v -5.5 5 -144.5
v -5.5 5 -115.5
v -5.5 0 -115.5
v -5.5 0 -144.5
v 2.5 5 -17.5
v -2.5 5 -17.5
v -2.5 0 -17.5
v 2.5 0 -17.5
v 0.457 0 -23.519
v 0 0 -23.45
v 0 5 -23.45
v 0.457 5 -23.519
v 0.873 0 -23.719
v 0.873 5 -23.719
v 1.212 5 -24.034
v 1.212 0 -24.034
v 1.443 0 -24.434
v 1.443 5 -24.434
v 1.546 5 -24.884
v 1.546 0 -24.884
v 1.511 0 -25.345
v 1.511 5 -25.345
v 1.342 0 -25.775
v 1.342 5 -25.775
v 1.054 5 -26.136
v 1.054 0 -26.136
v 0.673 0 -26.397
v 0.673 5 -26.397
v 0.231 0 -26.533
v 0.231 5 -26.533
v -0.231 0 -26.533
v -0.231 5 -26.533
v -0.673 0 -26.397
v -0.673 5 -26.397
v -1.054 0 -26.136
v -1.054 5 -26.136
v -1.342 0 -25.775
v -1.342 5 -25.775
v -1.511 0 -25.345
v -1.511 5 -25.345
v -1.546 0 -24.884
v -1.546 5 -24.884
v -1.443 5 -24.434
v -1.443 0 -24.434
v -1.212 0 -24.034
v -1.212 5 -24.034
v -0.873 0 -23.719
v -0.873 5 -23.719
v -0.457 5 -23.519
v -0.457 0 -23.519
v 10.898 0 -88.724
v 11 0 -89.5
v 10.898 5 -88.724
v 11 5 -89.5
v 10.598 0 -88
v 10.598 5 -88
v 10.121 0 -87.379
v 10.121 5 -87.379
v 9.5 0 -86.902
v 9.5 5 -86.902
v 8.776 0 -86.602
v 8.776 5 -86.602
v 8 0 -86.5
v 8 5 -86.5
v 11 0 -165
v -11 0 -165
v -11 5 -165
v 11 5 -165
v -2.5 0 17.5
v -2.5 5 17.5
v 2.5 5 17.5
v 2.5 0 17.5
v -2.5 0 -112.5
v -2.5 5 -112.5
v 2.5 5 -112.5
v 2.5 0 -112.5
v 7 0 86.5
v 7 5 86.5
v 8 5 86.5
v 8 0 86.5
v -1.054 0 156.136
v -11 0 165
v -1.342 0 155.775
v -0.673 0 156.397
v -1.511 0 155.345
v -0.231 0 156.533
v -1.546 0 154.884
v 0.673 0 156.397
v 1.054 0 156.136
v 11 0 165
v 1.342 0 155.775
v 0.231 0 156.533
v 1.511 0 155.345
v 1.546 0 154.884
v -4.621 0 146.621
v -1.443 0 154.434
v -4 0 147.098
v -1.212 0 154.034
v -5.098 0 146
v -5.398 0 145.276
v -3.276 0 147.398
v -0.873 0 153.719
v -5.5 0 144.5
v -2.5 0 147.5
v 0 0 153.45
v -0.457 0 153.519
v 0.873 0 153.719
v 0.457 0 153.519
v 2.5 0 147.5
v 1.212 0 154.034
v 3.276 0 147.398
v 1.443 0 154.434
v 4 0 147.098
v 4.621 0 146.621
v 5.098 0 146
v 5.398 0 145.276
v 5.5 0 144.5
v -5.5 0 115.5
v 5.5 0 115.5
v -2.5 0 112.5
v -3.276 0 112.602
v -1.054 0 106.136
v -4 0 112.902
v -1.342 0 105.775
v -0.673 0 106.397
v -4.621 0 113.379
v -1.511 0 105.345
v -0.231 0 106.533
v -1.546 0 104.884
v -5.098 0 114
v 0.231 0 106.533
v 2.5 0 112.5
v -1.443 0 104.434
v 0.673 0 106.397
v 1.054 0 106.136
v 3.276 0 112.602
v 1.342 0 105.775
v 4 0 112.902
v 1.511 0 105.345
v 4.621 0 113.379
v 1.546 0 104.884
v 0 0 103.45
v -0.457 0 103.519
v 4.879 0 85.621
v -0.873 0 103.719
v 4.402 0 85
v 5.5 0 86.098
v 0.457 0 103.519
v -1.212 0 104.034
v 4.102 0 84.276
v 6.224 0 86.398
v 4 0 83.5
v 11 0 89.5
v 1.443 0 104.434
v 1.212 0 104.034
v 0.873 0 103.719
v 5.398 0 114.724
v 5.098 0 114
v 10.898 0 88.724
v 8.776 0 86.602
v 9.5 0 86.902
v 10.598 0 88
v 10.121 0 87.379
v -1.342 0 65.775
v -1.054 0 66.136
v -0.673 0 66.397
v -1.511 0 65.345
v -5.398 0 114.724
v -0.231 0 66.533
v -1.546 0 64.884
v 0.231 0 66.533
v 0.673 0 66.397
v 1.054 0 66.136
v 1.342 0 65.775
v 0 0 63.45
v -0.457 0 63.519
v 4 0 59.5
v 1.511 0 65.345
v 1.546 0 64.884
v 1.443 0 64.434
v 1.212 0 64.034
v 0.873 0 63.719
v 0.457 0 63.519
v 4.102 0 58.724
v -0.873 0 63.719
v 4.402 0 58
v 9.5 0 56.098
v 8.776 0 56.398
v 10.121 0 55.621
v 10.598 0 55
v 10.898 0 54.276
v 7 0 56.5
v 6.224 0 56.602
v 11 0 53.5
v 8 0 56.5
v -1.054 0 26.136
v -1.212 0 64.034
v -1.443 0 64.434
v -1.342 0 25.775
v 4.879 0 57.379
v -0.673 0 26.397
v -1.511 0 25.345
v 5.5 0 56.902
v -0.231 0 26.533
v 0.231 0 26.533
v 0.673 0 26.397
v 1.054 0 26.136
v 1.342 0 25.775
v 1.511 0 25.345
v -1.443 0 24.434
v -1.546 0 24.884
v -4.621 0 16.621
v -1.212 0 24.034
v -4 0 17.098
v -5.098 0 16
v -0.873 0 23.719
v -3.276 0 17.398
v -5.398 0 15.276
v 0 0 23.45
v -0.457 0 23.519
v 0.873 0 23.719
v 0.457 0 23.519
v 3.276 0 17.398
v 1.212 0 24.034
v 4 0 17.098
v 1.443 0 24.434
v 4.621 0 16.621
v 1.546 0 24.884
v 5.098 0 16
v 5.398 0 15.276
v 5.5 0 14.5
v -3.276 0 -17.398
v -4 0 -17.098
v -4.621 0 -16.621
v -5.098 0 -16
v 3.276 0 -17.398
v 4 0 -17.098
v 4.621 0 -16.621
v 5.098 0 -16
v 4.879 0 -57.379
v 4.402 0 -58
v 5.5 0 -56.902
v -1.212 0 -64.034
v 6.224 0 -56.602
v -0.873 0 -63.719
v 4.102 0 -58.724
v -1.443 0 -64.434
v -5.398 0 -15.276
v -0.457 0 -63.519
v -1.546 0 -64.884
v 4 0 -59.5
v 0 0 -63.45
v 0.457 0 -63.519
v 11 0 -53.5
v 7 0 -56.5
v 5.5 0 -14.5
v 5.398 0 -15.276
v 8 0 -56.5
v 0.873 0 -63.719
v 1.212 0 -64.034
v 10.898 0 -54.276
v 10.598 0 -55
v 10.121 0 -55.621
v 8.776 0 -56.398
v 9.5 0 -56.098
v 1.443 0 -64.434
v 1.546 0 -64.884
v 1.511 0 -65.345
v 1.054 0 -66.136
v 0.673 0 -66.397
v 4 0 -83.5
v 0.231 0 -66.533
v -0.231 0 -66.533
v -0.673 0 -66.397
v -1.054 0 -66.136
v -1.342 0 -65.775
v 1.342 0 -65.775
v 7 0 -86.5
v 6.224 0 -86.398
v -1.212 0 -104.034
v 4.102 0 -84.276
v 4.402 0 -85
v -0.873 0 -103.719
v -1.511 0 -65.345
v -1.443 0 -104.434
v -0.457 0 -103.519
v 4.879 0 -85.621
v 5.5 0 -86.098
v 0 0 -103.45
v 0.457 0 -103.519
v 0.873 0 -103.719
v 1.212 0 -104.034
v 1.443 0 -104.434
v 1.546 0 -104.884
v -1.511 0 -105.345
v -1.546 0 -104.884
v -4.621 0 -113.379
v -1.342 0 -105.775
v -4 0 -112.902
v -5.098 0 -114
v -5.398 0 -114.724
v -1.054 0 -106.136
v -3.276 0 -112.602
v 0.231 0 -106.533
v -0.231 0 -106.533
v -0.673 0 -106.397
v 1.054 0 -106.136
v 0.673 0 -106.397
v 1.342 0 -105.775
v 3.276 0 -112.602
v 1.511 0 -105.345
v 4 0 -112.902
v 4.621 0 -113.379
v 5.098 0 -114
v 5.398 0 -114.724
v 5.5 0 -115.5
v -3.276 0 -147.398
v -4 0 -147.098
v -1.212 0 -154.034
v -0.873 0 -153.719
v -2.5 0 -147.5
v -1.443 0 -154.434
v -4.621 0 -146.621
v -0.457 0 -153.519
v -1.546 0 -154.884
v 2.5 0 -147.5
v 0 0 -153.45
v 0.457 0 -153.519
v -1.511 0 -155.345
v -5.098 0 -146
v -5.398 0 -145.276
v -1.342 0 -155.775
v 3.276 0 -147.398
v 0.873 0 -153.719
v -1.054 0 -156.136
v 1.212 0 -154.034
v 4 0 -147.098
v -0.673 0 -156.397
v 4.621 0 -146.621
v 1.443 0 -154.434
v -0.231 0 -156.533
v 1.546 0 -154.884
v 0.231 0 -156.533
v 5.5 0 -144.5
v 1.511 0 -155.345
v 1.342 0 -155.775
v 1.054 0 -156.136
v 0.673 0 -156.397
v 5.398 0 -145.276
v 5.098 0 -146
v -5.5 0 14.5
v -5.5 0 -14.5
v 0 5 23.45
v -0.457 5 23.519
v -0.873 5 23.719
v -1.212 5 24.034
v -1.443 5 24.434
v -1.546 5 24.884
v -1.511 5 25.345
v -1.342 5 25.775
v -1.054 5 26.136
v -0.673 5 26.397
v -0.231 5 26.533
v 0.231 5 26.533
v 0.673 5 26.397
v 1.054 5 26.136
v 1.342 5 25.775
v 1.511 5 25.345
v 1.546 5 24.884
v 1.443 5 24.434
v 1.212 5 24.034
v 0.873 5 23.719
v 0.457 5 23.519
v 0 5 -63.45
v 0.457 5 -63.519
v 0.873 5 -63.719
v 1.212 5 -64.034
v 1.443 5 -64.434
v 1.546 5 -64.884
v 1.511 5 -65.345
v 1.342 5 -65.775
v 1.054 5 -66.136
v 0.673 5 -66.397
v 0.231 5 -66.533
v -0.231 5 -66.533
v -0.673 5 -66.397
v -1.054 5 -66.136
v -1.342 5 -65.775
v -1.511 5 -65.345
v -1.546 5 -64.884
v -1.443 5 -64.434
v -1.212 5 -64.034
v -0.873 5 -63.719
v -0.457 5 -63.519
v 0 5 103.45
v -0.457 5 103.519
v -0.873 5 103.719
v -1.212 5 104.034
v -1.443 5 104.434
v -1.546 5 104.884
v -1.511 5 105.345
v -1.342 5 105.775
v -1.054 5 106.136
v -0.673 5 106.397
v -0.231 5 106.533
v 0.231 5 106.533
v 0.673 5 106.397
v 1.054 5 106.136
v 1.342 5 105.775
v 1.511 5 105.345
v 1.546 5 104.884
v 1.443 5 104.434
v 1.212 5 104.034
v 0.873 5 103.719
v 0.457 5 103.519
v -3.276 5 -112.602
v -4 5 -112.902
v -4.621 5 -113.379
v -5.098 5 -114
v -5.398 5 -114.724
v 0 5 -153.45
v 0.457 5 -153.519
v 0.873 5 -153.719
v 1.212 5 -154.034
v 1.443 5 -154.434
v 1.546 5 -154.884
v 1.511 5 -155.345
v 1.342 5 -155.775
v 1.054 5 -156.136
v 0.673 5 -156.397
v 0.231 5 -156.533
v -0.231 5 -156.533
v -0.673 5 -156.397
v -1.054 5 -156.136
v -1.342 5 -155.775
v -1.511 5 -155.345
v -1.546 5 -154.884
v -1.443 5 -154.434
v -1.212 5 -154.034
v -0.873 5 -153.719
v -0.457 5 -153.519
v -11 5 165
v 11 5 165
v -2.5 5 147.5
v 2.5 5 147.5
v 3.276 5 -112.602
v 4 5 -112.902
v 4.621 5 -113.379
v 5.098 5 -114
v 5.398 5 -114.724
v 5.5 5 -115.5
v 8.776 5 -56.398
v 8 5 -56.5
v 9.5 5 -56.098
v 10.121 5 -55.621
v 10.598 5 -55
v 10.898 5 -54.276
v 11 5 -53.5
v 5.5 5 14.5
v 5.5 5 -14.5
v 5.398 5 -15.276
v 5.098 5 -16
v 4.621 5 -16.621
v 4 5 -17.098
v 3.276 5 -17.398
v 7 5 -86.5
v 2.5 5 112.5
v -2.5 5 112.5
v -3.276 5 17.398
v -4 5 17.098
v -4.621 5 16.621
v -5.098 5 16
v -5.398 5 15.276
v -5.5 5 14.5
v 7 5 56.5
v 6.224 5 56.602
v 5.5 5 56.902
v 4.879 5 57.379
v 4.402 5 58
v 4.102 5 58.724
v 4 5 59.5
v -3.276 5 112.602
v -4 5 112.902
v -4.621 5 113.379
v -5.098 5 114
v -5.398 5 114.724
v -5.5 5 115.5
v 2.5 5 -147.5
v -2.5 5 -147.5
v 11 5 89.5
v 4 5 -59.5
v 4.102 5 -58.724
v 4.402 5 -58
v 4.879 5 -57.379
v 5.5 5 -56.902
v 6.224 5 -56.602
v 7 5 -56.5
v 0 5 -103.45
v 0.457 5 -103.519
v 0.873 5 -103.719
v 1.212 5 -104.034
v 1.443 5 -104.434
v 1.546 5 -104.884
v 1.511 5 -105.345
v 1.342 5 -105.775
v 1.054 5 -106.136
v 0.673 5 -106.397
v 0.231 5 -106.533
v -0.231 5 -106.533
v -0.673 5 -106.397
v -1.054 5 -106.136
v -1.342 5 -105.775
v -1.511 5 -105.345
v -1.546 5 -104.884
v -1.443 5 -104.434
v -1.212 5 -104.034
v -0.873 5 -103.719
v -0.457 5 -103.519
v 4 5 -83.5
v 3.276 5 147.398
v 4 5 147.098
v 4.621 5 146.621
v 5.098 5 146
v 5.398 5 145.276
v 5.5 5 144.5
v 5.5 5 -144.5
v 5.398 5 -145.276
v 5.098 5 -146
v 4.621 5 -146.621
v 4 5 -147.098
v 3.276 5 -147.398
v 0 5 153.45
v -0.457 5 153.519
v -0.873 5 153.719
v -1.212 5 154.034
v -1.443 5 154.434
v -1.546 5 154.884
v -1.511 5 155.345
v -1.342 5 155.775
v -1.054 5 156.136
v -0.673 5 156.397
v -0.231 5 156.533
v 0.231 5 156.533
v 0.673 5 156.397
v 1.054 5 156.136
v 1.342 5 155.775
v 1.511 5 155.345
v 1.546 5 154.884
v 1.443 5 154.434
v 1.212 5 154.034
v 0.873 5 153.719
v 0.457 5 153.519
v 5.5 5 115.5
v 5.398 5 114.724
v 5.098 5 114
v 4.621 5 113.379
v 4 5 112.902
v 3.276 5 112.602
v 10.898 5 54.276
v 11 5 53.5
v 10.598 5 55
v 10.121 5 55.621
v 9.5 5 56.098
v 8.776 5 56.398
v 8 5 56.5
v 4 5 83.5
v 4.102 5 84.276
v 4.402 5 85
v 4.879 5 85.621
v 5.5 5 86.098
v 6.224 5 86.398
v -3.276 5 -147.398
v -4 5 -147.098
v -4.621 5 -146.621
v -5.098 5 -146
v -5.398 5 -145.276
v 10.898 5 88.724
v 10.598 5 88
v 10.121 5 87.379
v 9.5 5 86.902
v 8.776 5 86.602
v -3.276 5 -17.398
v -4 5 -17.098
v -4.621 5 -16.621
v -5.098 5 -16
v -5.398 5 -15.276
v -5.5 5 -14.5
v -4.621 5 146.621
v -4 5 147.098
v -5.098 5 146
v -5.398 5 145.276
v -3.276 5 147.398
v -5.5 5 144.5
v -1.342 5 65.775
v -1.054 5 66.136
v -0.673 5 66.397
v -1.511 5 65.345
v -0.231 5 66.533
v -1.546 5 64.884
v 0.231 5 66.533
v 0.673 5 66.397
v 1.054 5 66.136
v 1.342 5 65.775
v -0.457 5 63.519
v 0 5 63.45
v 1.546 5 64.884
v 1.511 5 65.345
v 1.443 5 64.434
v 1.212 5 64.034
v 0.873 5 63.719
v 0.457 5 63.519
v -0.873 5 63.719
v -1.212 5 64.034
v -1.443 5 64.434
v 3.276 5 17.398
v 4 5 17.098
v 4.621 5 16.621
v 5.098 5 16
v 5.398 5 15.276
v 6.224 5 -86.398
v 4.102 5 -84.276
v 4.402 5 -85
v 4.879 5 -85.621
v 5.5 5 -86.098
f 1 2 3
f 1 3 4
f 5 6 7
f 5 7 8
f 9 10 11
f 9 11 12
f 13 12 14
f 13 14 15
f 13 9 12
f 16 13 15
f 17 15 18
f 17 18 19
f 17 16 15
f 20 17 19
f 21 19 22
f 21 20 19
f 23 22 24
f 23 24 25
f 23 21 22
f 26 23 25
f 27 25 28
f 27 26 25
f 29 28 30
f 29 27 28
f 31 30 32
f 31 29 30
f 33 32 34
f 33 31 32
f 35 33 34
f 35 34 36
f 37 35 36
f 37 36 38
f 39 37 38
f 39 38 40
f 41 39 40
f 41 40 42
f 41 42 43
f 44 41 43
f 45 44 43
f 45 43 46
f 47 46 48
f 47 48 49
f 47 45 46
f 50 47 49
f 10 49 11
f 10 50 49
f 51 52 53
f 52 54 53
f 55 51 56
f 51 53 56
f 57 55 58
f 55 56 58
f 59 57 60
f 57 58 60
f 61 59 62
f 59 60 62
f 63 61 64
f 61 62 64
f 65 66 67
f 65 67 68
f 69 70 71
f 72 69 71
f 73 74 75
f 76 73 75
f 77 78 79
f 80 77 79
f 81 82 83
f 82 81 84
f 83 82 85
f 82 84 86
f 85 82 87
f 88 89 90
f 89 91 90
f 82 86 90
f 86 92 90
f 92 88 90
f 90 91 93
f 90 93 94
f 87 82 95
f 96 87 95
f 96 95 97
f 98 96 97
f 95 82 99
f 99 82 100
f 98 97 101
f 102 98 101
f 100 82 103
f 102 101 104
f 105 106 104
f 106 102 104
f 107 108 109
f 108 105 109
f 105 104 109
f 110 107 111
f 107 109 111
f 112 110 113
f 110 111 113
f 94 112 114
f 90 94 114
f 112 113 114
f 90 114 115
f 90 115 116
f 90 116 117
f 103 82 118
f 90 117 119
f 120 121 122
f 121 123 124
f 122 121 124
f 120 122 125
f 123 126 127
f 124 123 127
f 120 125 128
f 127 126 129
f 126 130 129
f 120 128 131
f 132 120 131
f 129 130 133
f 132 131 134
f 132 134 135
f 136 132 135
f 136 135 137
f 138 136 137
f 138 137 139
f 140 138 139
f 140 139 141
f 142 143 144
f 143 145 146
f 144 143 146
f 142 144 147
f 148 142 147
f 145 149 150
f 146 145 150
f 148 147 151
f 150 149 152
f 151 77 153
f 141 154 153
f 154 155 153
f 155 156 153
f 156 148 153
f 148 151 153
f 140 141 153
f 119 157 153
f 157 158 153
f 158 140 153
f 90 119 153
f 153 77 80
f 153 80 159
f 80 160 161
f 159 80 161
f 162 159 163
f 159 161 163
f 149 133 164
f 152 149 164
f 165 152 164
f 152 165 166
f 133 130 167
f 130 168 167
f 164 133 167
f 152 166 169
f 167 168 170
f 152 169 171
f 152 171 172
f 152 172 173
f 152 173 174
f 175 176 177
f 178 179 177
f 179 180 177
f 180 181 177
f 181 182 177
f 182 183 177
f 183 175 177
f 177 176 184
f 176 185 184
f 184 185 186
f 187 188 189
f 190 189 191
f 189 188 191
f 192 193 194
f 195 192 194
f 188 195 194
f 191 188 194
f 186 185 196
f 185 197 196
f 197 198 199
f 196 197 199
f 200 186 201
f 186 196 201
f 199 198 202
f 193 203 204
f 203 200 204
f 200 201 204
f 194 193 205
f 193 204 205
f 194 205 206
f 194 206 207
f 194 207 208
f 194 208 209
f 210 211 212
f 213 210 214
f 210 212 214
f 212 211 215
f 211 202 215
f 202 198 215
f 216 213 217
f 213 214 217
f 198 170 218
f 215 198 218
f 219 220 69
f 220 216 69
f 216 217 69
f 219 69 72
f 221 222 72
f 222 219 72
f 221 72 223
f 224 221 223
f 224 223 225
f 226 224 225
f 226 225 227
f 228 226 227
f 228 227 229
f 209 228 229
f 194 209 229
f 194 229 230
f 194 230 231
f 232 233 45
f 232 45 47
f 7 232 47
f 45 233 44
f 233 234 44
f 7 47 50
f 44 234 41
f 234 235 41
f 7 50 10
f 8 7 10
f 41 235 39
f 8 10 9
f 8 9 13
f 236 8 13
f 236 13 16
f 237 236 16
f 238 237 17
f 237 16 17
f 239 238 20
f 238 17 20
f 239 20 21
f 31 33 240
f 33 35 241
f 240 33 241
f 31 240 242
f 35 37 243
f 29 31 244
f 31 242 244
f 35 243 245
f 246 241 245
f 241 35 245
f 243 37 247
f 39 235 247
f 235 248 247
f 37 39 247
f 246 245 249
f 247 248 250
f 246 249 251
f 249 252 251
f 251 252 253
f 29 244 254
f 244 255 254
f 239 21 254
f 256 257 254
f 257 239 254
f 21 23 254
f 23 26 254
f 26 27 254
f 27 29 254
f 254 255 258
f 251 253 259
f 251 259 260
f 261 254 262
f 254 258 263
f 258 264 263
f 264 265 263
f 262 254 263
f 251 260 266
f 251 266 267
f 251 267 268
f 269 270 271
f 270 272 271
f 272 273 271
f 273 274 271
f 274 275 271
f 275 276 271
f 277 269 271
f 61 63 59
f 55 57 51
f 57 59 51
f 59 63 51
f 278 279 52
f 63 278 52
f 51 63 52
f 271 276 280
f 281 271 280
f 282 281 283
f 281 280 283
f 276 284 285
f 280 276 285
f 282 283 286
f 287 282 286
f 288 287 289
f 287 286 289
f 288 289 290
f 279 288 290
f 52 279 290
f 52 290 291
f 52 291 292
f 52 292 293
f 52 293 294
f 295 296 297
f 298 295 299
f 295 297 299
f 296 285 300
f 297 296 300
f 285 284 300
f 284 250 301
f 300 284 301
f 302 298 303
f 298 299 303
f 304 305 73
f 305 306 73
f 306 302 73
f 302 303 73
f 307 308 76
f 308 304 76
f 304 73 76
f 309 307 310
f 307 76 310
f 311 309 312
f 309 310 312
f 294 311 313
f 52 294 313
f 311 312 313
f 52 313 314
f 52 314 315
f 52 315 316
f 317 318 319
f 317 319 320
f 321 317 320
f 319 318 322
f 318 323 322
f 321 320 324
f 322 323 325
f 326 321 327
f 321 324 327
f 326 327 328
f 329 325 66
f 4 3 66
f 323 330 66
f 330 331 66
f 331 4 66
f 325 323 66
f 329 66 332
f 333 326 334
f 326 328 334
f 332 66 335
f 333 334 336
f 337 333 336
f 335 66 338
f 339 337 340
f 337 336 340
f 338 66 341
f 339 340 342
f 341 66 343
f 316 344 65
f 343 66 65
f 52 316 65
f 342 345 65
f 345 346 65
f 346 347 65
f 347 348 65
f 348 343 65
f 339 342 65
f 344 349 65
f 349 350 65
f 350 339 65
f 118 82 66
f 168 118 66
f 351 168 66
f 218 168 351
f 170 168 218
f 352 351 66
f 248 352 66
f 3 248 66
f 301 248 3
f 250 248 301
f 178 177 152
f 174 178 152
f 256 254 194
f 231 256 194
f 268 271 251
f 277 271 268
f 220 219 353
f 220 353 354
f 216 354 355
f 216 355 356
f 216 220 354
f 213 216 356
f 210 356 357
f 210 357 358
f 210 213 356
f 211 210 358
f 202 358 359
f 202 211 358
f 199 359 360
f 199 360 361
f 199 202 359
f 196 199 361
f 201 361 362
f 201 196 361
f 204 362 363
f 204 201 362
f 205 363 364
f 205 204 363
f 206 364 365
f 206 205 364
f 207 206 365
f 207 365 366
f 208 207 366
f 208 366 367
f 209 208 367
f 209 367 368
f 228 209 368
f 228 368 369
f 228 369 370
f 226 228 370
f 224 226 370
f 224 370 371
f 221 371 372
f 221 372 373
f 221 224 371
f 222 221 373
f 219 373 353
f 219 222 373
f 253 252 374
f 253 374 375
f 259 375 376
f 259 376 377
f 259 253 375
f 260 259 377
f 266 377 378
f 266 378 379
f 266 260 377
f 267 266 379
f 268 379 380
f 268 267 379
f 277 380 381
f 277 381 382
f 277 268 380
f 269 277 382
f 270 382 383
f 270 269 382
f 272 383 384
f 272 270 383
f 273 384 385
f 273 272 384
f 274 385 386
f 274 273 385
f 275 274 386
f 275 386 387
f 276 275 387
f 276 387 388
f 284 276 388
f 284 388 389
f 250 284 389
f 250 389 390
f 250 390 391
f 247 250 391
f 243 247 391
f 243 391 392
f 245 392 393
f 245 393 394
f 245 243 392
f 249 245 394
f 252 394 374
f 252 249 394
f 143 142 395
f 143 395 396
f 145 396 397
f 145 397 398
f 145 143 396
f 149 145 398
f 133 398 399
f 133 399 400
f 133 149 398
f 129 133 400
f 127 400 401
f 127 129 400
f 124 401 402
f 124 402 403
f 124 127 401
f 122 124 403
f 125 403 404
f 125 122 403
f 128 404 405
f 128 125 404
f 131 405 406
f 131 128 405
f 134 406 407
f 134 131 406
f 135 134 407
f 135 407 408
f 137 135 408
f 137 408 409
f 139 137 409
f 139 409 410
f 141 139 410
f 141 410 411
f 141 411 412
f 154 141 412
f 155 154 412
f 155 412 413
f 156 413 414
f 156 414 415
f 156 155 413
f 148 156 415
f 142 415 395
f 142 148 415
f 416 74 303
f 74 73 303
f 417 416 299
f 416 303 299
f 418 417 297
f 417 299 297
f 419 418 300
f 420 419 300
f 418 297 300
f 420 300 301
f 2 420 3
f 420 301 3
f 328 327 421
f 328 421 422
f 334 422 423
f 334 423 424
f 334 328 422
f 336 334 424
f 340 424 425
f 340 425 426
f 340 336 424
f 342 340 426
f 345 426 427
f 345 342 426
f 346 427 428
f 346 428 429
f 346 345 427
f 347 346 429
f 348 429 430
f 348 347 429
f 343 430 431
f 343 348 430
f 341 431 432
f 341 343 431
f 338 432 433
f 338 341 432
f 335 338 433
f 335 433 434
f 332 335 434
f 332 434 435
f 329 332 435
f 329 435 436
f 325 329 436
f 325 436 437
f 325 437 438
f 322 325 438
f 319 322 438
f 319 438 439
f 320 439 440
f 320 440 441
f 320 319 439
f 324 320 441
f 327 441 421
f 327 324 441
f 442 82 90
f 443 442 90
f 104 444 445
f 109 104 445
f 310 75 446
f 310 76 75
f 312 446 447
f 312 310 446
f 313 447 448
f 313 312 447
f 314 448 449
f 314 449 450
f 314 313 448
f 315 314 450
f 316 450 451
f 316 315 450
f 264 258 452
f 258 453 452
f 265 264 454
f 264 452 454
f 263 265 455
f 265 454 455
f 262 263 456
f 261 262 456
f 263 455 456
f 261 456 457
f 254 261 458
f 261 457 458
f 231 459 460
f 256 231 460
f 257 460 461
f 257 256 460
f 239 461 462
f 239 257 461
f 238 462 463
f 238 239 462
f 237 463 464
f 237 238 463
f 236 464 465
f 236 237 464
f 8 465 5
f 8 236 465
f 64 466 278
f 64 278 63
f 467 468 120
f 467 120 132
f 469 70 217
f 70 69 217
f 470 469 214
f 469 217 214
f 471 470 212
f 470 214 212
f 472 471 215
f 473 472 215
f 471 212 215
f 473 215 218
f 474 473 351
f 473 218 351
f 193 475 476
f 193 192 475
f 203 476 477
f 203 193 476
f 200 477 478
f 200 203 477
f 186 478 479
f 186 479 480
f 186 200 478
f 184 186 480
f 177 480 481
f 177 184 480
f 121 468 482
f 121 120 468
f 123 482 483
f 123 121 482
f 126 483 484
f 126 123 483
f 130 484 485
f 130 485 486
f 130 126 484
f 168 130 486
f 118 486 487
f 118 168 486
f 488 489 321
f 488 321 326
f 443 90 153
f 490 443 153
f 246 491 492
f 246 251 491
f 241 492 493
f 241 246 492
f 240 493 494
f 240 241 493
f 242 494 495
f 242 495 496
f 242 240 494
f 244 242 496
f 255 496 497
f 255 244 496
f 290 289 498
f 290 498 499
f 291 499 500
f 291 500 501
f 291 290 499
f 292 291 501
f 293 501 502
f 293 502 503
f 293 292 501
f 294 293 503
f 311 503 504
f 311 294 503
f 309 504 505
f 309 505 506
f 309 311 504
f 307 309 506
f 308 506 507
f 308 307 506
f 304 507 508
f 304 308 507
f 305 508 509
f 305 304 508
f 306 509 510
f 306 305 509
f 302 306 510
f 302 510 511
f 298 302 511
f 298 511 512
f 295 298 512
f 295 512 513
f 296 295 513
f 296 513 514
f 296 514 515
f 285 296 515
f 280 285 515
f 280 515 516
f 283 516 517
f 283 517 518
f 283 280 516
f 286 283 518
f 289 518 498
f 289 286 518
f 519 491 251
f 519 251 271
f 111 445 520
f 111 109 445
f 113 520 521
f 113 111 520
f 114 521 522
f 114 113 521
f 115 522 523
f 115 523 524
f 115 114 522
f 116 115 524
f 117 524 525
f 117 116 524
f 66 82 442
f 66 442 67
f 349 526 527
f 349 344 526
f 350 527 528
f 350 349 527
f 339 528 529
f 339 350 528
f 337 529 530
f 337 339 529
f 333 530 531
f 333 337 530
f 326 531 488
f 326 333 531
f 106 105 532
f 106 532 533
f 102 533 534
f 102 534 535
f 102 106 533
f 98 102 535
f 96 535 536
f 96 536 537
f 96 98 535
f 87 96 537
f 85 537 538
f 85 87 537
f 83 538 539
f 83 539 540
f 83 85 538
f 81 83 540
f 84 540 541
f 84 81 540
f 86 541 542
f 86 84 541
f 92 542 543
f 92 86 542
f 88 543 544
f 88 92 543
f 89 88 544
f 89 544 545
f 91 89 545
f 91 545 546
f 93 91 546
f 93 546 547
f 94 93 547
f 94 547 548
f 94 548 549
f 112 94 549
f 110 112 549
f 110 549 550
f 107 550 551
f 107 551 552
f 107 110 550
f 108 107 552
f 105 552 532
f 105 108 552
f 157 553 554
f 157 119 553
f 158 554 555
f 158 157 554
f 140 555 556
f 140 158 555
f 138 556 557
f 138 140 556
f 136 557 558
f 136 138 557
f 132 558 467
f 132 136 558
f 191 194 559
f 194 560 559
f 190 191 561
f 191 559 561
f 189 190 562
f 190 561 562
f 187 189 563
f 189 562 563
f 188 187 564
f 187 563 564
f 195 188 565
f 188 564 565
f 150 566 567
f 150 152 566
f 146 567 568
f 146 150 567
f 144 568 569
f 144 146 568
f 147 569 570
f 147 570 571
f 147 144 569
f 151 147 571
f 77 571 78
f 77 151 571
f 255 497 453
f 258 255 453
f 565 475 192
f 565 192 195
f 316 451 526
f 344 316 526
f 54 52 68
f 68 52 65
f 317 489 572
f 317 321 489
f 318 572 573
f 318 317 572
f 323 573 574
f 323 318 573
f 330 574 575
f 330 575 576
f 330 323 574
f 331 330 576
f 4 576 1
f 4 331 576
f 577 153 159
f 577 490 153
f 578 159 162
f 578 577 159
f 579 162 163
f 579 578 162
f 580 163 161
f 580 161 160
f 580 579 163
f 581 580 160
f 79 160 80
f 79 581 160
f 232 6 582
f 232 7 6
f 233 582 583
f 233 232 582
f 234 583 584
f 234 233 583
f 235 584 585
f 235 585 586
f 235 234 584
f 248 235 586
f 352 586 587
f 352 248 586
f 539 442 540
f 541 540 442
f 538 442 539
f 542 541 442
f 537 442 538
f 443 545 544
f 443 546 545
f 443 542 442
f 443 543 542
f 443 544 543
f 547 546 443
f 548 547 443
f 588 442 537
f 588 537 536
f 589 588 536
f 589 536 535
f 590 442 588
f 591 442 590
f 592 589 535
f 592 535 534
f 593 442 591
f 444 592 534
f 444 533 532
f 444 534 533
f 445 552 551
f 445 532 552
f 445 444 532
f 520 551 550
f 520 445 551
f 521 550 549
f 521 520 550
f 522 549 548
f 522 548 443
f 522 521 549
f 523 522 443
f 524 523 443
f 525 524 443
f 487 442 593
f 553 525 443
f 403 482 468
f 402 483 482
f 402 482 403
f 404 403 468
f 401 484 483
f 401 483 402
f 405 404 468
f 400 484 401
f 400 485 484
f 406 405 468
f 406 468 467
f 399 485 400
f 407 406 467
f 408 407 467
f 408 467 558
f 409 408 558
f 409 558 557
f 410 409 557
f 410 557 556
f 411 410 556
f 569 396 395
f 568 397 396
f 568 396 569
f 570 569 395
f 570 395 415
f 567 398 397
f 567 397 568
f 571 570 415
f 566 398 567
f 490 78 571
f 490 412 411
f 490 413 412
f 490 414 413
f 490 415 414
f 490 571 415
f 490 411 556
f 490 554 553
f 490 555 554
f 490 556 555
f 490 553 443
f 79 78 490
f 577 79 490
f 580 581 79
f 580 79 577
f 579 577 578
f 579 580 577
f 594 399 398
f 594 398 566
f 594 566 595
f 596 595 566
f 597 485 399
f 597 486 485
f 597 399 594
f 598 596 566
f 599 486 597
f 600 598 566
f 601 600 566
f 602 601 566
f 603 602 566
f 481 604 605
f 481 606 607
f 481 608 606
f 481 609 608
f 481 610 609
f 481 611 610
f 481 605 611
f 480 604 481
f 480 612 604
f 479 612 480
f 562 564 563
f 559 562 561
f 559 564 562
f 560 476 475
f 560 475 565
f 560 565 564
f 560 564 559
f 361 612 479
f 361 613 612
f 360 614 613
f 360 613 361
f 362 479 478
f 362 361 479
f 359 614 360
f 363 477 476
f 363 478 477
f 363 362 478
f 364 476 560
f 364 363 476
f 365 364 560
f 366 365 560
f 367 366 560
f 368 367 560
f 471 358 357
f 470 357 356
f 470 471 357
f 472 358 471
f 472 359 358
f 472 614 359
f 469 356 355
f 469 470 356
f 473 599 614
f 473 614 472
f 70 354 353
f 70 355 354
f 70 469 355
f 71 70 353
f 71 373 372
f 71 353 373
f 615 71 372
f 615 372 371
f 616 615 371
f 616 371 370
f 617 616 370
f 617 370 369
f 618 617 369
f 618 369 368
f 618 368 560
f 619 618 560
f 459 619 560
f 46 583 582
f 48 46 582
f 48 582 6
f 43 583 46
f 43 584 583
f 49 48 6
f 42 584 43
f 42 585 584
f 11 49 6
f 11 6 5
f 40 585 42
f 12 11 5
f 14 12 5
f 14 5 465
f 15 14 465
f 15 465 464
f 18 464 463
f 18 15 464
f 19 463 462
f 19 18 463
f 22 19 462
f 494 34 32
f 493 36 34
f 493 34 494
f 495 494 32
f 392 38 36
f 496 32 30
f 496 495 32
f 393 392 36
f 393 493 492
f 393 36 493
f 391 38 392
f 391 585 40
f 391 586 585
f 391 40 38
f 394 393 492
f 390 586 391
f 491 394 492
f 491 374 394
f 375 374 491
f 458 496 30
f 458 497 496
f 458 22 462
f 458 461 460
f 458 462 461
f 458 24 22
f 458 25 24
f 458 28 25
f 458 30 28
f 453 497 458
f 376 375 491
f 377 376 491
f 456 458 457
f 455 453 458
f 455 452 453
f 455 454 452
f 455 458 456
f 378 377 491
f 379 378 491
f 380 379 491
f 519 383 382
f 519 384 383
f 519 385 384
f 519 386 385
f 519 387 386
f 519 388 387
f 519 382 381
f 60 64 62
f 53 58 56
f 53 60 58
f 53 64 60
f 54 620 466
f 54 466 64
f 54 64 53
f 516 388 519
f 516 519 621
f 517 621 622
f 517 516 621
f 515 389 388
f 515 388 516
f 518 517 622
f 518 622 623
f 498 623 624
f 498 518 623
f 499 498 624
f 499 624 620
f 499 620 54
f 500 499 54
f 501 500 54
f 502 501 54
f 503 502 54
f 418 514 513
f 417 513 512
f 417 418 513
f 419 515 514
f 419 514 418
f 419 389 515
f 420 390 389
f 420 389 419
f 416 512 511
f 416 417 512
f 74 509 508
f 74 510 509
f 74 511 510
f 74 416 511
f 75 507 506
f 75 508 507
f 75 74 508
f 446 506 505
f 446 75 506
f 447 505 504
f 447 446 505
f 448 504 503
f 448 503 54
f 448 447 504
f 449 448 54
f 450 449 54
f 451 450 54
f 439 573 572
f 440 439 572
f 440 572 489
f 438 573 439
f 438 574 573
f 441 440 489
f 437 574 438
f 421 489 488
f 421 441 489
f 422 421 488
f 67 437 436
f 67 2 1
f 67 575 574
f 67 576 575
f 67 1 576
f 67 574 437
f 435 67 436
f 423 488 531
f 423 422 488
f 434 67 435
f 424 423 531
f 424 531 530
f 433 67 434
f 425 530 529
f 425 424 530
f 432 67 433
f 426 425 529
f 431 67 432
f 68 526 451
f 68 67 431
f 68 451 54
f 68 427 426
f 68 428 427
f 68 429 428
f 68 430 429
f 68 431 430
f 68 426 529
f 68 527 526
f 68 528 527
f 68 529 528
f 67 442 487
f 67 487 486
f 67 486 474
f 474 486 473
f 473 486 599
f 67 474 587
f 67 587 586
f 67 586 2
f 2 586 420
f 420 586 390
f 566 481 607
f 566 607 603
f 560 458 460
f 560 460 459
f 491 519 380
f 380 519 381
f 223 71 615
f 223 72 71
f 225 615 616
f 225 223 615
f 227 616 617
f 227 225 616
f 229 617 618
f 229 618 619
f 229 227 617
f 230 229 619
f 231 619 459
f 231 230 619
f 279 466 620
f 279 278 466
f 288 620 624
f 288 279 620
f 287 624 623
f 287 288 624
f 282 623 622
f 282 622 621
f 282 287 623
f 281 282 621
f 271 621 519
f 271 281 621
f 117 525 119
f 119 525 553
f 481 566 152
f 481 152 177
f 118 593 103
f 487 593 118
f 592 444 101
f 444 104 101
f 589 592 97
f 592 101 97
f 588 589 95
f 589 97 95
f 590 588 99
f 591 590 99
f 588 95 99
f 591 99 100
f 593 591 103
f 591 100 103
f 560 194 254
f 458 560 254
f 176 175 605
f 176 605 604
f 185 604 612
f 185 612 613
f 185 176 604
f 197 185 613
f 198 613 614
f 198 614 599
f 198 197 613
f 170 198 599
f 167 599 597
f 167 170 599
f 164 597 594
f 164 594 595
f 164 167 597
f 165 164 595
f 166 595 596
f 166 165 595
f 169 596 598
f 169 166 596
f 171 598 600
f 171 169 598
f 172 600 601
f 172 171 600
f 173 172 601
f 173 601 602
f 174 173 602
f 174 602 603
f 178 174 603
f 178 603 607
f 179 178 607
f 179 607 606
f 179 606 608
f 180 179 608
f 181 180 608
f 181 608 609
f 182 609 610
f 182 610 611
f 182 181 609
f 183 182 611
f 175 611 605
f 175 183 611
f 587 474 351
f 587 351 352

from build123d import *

# Parameters (mm, degrees)
SKETCH_1_W          = 22
SKETCH_1_H          = 330
SKETCH_1_R          = 1.55
EXTRUDE_1_DEPTH     = 5
SKETCH_2_W          = 14
SKETCH_2_H          = 30
CUT_EXTRUDE_1_DEPTH = 166.441832678
FILLET_1_R          = 3
SKETCH_3_W          = 11
SKETCH_3_H          = 35
CUT_EXTRUDE_2_DEPTH = 166.441832678
FILLET_2_R          = 3


with BuildPart() as part:
    # 草图1 → 凸台-拉伸1 (new body)
    with BuildSketch(Plane(origin=(0, 0, 0), x_dir=(1, 0, 0), z_dir=(0, 1, 0))):
        Rectangle(SKETCH_1_W, SKETCH_1_H)
        with Locations(Location((0, 25, 0), (0, 0, 270))):
            Circle(SKETCH_1_R, mode=Mode.SUBTRACT)
        with Locations(Location((0, 65, 0), (0, 0, 270))):
            Circle(SKETCH_1_R, mode=Mode.SUBTRACT)
        with Locations(Location((0, -25, 0), (0, 0, 90))):
            Circle(SKETCH_1_R, mode=Mode.SUBTRACT)
        with Locations(Location((0, -65, 0), (0, 0, 90))):
            Circle(SKETCH_1_R, mode=Mode.SUBTRACT)
        with Locations(Location((0, 105, 0), (0, 0, 270))):
            Circle(SKETCH_1_R, mode=Mode.SUBTRACT)
        with Locations(Location((0, 155, 0), (0, 0, 270))):
            Circle(SKETCH_1_R, mode=Mode.SUBTRACT)
        with Locations(Location((0, -155, 0), (0, 0, 90))):
            Circle(SKETCH_1_R, mode=Mode.SUBTRACT)
        with Locations(Location((0, -105, 0), (0, 0, 90))):
            Circle(SKETCH_1_R, mode=Mode.SUBTRACT)
    extrude(amount=EXTRUDE_1_DEPTH)

    # 草图2 → 切除-拉伸1 (cut, through all)
    with BuildSketch(Plane(origin=(0, 5, 0), x_dir=(1, 0, 0), z_dir=(0, 1, 0))):
        with Locations((11, 71.5)):
            Rectangle(SKETCH_2_W, SKETCH_2_H)
        with Locations((11, -71.5)):
            Rectangle(SKETCH_2_W, SKETCH_2_H)
    extrude(amount=-CUT_EXTRUDE_1_DEPTH, mode=Mode.SUBTRACT)

    # 圆角1
    fillet_1_edges = [part.edges().sort_by_distance(p)[0] for p in [
        (11, 2.5, 86.5),
        (11, 2.5, 56.5),
        (11, 2.5, -86.5),
        (11, 2.5, -56.5),
        (4, 2.5, -86.5),
        (4, 2.5, -56.5),
        (4, 2.5, 56.5),
        (4, 2.5, 86.5),
    ]]
    fillet(fillet_1_edges, radius=FILLET_1_R)

    # 草图3 → 切除-拉伸2 (cut, through all)
    with BuildSketch(Plane(origin=(0, 5, 0), x_dir=(1, 0, 0), z_dir=(0, 1, 0))):
        with Locations((0, 130)):
            Rectangle(SKETCH_3_W, SKETCH_3_H)
        with Locations((0, -130)):
            Rectangle(SKETCH_3_W, SKETCH_3_H)
        Rectangle(SKETCH_3_W, SKETCH_3_H)
    extrude(amount=-CUT_EXTRUDE_2_DEPTH, mode=Mode.SUBTRACT)

    # 圆角2
    fillet_2_edges = [part.edges().sort_by_distance(p)[0] for p in [
        (5.5, 2.5, -147.5),
        (5.5, 2.5, -112.5),
        (-5.5, 2.5, -112.5),
        (-5.5, 2.5, -147.5),
        (-5.5, 2.5, 147.5),
        (-5.5, 2.5, 112.5),
        (5.5, 2.5, 112.5),
        (5.5, 2.5, 147.5),
        (5.5, 2.5, -17.5),
        (5.5, 2.5, 17.5),
        (-5.5, 2.5, 17.5),
        (-5.5, 2.5, -17.5),
    ]]
    fillet(fillet_2_edges, radius=FILLET_2_R)


solid = part.part
